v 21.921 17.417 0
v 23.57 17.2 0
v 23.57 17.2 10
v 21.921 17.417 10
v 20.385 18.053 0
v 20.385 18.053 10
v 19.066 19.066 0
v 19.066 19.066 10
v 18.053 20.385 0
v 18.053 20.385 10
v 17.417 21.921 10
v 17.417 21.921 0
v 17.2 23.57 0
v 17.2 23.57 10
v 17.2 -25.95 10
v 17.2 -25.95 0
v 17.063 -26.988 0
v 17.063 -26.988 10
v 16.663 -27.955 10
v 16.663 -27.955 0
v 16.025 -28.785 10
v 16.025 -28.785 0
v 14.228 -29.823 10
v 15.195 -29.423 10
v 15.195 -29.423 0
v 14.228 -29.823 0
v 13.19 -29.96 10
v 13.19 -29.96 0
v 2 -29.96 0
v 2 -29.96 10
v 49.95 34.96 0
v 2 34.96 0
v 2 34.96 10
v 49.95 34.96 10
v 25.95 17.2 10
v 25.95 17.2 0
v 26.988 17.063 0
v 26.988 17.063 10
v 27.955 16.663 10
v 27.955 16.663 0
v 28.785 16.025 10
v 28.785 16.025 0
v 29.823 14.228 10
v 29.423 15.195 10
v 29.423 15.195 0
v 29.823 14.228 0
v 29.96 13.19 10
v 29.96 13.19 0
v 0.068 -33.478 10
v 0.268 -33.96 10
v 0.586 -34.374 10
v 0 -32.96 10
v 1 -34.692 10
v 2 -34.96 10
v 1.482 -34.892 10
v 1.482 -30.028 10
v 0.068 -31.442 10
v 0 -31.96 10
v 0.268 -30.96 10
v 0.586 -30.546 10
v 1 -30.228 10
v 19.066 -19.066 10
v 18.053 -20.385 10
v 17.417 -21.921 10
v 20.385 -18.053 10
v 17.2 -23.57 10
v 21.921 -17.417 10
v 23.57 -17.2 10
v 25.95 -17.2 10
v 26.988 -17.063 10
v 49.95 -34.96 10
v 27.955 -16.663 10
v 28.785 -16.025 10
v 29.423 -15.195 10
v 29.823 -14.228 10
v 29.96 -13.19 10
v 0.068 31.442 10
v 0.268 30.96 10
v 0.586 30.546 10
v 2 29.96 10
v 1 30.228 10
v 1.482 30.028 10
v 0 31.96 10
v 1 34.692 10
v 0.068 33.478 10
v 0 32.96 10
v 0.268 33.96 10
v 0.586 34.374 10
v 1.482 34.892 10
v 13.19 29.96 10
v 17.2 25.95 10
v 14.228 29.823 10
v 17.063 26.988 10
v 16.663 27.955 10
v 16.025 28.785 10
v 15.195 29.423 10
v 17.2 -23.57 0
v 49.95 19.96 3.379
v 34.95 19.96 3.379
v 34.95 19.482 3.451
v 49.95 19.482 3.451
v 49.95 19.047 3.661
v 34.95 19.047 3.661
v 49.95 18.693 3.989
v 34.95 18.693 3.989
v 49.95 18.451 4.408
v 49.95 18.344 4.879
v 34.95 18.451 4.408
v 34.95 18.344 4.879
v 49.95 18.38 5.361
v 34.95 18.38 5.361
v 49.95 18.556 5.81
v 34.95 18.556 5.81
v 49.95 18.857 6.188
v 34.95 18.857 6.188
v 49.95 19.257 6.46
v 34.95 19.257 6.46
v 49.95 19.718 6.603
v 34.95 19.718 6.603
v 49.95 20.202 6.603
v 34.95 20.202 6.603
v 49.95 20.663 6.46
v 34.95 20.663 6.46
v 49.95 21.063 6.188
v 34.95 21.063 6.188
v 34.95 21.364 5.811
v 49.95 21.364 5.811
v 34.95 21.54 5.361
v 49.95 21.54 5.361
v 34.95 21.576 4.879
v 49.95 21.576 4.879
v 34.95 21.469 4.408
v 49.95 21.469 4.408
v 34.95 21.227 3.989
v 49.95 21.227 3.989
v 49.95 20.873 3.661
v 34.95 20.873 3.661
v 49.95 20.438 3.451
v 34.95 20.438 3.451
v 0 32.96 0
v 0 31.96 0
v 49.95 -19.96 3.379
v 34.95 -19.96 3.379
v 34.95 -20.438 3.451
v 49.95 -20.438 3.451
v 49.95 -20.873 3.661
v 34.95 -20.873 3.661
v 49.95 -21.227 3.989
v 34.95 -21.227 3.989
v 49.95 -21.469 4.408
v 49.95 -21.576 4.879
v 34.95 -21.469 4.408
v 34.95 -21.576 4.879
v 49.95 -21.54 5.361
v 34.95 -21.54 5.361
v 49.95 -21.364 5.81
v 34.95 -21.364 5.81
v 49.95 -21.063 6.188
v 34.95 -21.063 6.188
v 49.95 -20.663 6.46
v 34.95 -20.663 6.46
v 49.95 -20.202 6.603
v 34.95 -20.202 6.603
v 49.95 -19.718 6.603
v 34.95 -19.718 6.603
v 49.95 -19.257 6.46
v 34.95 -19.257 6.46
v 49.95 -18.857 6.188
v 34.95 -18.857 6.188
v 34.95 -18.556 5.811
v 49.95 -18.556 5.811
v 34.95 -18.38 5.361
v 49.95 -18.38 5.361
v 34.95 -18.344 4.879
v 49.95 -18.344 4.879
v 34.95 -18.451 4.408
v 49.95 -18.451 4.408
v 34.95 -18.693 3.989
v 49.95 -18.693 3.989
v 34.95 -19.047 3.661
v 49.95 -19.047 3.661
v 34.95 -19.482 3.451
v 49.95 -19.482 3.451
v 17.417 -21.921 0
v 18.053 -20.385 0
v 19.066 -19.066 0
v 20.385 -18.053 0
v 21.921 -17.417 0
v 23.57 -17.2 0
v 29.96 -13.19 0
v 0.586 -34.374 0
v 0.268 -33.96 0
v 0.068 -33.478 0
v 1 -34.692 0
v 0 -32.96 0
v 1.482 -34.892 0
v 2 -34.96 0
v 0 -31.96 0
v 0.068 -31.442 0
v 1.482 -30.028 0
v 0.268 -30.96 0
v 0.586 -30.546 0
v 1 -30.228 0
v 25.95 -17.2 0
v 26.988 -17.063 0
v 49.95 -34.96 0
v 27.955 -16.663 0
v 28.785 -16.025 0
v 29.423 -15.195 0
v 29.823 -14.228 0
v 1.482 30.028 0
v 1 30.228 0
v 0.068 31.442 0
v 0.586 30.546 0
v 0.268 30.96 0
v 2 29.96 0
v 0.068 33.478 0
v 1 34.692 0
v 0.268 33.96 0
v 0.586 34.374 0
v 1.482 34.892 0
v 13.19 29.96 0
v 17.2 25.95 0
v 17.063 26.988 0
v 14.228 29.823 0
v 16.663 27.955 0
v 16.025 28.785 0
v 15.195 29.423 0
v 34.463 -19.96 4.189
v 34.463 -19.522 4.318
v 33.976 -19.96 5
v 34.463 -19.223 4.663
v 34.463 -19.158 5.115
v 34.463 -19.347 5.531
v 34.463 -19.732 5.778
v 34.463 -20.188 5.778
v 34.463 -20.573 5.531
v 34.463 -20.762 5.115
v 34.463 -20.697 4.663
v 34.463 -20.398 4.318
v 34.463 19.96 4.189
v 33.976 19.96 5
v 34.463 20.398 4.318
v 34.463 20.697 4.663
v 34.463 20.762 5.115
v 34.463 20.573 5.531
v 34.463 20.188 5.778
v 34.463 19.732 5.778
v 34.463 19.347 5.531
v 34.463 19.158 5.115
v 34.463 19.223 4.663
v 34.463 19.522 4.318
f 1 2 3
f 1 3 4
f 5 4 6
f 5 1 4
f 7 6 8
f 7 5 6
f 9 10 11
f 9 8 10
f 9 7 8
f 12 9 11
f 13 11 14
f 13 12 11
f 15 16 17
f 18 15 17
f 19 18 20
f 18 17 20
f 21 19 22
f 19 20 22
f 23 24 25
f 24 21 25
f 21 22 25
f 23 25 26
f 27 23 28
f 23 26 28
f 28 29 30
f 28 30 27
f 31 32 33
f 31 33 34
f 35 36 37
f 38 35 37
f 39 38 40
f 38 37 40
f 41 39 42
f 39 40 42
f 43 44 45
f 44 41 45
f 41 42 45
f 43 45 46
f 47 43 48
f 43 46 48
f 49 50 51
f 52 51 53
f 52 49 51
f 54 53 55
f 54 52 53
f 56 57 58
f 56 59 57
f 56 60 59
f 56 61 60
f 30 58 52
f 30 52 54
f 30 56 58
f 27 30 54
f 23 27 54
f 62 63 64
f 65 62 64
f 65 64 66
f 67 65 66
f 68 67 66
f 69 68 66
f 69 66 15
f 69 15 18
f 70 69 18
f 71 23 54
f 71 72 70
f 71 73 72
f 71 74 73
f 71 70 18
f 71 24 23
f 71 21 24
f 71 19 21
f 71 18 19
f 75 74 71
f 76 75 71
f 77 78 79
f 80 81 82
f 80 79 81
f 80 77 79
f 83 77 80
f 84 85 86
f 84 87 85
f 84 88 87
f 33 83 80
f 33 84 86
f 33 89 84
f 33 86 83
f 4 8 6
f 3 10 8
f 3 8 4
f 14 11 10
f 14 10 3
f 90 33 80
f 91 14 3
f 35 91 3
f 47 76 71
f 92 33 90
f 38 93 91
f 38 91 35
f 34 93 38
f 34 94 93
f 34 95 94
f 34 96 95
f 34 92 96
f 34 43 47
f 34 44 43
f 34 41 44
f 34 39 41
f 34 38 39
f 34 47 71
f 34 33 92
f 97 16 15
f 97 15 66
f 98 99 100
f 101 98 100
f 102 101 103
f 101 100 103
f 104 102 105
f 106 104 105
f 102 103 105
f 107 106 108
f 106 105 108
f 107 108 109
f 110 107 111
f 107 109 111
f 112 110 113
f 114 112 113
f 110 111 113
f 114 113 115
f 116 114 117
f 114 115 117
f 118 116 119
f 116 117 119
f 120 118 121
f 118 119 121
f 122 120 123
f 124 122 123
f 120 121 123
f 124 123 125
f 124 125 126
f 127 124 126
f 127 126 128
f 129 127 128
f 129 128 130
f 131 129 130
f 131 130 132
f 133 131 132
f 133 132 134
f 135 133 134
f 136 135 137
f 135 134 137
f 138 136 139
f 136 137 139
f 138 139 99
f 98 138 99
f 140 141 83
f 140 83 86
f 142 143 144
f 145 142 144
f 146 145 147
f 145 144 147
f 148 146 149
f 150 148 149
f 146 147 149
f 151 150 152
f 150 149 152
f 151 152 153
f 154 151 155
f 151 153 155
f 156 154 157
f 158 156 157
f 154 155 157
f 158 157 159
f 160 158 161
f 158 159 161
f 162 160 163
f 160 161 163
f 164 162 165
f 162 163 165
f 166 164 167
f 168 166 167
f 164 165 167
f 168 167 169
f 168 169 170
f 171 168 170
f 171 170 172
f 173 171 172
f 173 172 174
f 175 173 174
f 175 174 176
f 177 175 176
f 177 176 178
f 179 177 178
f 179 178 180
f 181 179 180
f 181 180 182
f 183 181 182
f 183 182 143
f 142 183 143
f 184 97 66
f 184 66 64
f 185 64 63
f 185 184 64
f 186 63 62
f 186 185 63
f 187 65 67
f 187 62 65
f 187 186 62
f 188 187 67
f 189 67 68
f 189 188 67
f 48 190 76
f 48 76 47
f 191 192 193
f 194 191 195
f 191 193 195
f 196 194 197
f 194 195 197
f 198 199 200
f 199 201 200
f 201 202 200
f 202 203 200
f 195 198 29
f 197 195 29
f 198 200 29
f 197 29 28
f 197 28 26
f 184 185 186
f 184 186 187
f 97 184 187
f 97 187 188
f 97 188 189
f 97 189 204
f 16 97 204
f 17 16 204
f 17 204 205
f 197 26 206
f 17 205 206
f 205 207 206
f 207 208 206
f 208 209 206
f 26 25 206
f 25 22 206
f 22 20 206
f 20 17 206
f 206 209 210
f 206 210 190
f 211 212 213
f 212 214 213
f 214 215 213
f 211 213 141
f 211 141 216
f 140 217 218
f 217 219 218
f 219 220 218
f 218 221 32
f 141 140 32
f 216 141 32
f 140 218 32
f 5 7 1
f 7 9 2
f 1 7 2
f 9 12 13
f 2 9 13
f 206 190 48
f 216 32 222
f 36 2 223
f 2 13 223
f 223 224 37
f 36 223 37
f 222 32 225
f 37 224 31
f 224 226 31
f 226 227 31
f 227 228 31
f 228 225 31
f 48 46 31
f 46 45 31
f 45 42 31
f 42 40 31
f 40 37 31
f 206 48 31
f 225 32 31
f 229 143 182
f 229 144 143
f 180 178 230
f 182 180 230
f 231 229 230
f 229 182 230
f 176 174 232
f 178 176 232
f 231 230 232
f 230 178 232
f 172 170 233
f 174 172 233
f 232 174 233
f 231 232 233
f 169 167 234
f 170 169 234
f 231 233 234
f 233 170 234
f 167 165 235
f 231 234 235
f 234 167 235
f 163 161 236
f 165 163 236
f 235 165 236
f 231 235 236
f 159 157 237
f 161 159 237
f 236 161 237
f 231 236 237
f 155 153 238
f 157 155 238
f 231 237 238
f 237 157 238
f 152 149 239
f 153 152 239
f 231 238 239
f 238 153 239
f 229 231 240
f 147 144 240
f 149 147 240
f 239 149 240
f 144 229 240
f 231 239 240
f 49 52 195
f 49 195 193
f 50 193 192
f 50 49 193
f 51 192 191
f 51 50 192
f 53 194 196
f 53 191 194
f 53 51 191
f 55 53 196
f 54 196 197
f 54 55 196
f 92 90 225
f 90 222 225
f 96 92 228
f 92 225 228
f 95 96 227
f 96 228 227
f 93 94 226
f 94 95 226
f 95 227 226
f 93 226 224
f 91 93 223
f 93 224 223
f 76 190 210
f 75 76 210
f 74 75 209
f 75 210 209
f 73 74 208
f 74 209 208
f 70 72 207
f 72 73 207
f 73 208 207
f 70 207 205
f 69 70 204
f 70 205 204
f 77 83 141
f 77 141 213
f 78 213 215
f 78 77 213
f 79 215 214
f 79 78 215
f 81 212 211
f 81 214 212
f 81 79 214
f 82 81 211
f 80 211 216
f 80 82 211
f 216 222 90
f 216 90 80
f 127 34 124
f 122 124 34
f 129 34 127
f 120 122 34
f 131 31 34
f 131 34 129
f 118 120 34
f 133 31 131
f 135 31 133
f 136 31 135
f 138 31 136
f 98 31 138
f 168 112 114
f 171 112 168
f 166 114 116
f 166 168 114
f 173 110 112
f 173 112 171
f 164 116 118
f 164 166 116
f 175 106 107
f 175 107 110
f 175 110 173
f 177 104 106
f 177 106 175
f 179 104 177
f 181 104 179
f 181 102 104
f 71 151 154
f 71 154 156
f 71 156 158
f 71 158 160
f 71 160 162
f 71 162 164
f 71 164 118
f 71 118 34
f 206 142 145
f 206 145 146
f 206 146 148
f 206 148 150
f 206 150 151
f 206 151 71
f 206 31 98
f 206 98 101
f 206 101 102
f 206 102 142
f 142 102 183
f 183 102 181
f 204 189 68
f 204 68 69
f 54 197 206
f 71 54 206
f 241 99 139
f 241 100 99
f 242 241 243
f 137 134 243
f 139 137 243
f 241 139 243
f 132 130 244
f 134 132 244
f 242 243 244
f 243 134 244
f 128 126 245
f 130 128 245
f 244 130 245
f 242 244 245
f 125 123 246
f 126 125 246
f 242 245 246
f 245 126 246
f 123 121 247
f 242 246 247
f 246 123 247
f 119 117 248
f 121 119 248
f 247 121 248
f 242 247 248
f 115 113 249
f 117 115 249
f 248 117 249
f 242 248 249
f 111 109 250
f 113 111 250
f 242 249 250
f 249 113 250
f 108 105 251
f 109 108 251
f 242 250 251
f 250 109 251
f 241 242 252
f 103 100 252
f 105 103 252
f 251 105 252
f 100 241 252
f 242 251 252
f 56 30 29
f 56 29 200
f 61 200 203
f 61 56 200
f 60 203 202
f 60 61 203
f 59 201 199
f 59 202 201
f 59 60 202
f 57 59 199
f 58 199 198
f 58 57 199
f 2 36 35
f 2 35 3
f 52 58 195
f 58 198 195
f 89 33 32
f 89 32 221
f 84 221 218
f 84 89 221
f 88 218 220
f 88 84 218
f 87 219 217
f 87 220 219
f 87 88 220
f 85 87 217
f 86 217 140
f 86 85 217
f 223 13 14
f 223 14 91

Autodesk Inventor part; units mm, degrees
ref_plane "YZ Plane" through (0, 0, 0) normal (1, 0, 0) x (0, 1, 0)
ref_plane "XZ Plane" through (0, 0, 0) normal (0, 1, 0) x (-1, 0, 0)
ref_plane "Work Plane1" through (0, 0, 0) normal (0, 0, 1) x (1, 0, 0)
sketch "Sketch1" plane through (0, 0, 0) normal (0, 0, 1) x (1, 0, 0)
  arc A0 (13.19, -29.76) -> (17, -25.95) centre (13.19, -25.95) ccw projected
  line L0 (17, -25.95) -> (17, -23.57) projected
  arc A1 (23.57, -17) -> (17, -23.57) centre (23.57, -23.57) ccw projected
  line L1 (23.57, -17) -> (25.95, -17) projected
  arc A2 (25.95, -17) -> (29.76, -13.19) centre (25.95, -13.19) ccw projected
  line L2 (29.76, -13.19) -> (29.76, 13.19) projected
  arc A3 (29.76, 13.19) -> (25.95, 17) centre (25.95, 13.19) ccw projected
  line L3 (25.95, 17) -> (23.57, 17) projected
  arc A4 (17, 23.57) -> (23.57, 17) centre (23.57, 23.57) ccw projected
  line L4 (17, 23.57) -> (17, 25.95) projected
  arc A5 (17, 25.95) -> (13.19, 29.76) centre (13.19, 25.95) ccw projected
  line L5 (13.19, 29.76) -> (-13.19, 29.76) projected
  arc A6 (-13.19, 29.76) -> (-17, 25.95) centre (-13.19, 25.95) ccw projected
  line L6 (-17, 25.95) -> (-17, 23.57) projected
  arc A7 (-23.57, 17) -> (-17, 23.57) centre (-23.57, 23.57) ccw projected
  line L7 (-23.57, 17) -> (-25.95, 17) projected
  arc A8 (-25.95, 17) -> (-29.76, 13.19) centre (-25.95, 13.19) ccw projected
  line L8 (-29.76, 13.19) -> (-29.76, -13.19) projected
  arc A9 (-29.76, -13.19) -> (-25.95, -17) centre (-25.95, -13.19) ccw projected
  line L9 (-25.95, -17) -> (-23.57, -17) projected
  arc A10 (-17, -23.57) -> (-23.57, -17) centre (-23.57, -23.57) ccw projected
  line L10 (-17, -23.57) -> (-17, -25.95) projected
  arc A11 (-17, -25.95) -> (-13.19, -29.76) centre (-13.19, -25.95) ccw projected
  line L11 (-13.19, -29.76) -> (13.19, -29.76) projected
  line L12 (49.95, 90) -> (49.95, -90) projected
  arc A12 (13.19, -29.96) -> (17.2, -25.95) centre (13.19, -25.95) ccw
  line L13 (17.2, -25.95) -> (17.2, -23.57)
  arc A13 (23.57, -17.2) -> (17.2, -23.57) centre (23.57, -23.57) ccw
  line L14 (23.57, -17.2) -> (25.95, -17.2)
  arc A14 (25.95, -17.2) -> (29.96, -13.19) centre (25.95, -13.19) ccw
  line L15 (29.96, -13.19) -> (29.96, 13.19)
  arc A15 (29.96, 13.19) -> (25.95, 17.2) centre (25.95, 13.19) ccw
  line L16 (25.95, 17.2) -> (23.57, 17.2)
  arc A16 (17.2, 23.57) -> (23.57, 17.2) centre (23.57, 23.57) ccw
  line L17 (17.2, 23.57) -> (17.2, 25.95)
  arc A17 (17.2, 25.95) -> (13.19, 29.96) centre (13.19, 25.95) ccw
  line L18 (13.19, 29.96) -> (-13.19, 29.96)
  arc A18 (-13.19, 29.96) -> (-17.2, 25.95) centre (-13.19, 25.95) ccw
  line L19 (-17.2, 25.95) -> (-17.2, 23.57)
  arc A19 (-23.57, 17.2) -> (-17.2, 23.57) centre (-23.57, 23.57) ccw
  line L20 (-23.57, 17.2) -> (-25.95, 17.2)
  arc A20 (-25.95, 17.2) -> (-29.96, 13.19) centre (-25.95, 13.19) ccw
  line L21 (-29.96, 13.19) -> (-29.96, -13.19)
  arc A21 (-29.96, -13.19) -> (-25.95, -17.2) centre (-25.95, -13.19) ccw
  line L22 (-25.95, -17.2) -> (-23.57, -17.2)
  arc A22 (-17.2, -23.57) -> (-23.57, -17.2) centre (-23.57, -23.57) ccw
  line L23 (-17.2, -23.57) -> (-17.2, -25.95)
  arc A23 (-17.2, -25.95) -> (-13.19, -29.96) centre (-13.19, -25.95) ccw
  line L24 (-13.19, -29.96) -> (13.19, -29.96)
  line L25 (0, -29.96) -> (0, -34.96)
  line L26 (0, -34.96) -> (49.95, -34.96)
  line L27 (0, 29.96) -> (0, 34.96)
  line L28 (0, 34.96) -> (49.95, 34.96)
  point P0 (0, 0)
  dimension "d0" = 0.2
  dimension "d1" = 5
extrude "Extrusion1" add sketch "Sketch1" along normal blind 10 contours L12 L26 L25 L24 A12 L13 A13 L14 A14 L15 A15 L16 A16 L17 A17 L18 L27 L28
fillet "Fillet1" radius 2 4 edges at (0, -29.96, 5) (0, -34.96, 5) (0, 34.96, 5) (0, 29.96, 5)
sketch "Sketch2" plane through (49.95, -34.96, 0) normal (1, 0, 0) x (0, 0, -1)
  line L0 (-10, 0) -> (-10, 69.92) projected
  line L1 (0, 0) -> (-10, 0) projected
  line L2 (0, 69.92) -> (-10, 69.92) projected
  line L3 (0, 0) -> (0, 69.92) projected
  point P0 (0, 34.96)
  point P1 (-5, 15)
  point P2 (-5, 54.92)
  point P3 (-5, 69.92)
  dimension "d5" = 15
  dimension "d6" = 15
hole "Hole1" at (49.95, -19.96, 5) at (49.95, 19.96, 5) direction (-1, 0, 0) diameter 3.242 depth 15 tip angle 118 thread size "M4x0.7" class "6H" standard "ISO Metric profile"
equation "\"d6\" = d5"
properties part number "nema23steun 10 mm"
